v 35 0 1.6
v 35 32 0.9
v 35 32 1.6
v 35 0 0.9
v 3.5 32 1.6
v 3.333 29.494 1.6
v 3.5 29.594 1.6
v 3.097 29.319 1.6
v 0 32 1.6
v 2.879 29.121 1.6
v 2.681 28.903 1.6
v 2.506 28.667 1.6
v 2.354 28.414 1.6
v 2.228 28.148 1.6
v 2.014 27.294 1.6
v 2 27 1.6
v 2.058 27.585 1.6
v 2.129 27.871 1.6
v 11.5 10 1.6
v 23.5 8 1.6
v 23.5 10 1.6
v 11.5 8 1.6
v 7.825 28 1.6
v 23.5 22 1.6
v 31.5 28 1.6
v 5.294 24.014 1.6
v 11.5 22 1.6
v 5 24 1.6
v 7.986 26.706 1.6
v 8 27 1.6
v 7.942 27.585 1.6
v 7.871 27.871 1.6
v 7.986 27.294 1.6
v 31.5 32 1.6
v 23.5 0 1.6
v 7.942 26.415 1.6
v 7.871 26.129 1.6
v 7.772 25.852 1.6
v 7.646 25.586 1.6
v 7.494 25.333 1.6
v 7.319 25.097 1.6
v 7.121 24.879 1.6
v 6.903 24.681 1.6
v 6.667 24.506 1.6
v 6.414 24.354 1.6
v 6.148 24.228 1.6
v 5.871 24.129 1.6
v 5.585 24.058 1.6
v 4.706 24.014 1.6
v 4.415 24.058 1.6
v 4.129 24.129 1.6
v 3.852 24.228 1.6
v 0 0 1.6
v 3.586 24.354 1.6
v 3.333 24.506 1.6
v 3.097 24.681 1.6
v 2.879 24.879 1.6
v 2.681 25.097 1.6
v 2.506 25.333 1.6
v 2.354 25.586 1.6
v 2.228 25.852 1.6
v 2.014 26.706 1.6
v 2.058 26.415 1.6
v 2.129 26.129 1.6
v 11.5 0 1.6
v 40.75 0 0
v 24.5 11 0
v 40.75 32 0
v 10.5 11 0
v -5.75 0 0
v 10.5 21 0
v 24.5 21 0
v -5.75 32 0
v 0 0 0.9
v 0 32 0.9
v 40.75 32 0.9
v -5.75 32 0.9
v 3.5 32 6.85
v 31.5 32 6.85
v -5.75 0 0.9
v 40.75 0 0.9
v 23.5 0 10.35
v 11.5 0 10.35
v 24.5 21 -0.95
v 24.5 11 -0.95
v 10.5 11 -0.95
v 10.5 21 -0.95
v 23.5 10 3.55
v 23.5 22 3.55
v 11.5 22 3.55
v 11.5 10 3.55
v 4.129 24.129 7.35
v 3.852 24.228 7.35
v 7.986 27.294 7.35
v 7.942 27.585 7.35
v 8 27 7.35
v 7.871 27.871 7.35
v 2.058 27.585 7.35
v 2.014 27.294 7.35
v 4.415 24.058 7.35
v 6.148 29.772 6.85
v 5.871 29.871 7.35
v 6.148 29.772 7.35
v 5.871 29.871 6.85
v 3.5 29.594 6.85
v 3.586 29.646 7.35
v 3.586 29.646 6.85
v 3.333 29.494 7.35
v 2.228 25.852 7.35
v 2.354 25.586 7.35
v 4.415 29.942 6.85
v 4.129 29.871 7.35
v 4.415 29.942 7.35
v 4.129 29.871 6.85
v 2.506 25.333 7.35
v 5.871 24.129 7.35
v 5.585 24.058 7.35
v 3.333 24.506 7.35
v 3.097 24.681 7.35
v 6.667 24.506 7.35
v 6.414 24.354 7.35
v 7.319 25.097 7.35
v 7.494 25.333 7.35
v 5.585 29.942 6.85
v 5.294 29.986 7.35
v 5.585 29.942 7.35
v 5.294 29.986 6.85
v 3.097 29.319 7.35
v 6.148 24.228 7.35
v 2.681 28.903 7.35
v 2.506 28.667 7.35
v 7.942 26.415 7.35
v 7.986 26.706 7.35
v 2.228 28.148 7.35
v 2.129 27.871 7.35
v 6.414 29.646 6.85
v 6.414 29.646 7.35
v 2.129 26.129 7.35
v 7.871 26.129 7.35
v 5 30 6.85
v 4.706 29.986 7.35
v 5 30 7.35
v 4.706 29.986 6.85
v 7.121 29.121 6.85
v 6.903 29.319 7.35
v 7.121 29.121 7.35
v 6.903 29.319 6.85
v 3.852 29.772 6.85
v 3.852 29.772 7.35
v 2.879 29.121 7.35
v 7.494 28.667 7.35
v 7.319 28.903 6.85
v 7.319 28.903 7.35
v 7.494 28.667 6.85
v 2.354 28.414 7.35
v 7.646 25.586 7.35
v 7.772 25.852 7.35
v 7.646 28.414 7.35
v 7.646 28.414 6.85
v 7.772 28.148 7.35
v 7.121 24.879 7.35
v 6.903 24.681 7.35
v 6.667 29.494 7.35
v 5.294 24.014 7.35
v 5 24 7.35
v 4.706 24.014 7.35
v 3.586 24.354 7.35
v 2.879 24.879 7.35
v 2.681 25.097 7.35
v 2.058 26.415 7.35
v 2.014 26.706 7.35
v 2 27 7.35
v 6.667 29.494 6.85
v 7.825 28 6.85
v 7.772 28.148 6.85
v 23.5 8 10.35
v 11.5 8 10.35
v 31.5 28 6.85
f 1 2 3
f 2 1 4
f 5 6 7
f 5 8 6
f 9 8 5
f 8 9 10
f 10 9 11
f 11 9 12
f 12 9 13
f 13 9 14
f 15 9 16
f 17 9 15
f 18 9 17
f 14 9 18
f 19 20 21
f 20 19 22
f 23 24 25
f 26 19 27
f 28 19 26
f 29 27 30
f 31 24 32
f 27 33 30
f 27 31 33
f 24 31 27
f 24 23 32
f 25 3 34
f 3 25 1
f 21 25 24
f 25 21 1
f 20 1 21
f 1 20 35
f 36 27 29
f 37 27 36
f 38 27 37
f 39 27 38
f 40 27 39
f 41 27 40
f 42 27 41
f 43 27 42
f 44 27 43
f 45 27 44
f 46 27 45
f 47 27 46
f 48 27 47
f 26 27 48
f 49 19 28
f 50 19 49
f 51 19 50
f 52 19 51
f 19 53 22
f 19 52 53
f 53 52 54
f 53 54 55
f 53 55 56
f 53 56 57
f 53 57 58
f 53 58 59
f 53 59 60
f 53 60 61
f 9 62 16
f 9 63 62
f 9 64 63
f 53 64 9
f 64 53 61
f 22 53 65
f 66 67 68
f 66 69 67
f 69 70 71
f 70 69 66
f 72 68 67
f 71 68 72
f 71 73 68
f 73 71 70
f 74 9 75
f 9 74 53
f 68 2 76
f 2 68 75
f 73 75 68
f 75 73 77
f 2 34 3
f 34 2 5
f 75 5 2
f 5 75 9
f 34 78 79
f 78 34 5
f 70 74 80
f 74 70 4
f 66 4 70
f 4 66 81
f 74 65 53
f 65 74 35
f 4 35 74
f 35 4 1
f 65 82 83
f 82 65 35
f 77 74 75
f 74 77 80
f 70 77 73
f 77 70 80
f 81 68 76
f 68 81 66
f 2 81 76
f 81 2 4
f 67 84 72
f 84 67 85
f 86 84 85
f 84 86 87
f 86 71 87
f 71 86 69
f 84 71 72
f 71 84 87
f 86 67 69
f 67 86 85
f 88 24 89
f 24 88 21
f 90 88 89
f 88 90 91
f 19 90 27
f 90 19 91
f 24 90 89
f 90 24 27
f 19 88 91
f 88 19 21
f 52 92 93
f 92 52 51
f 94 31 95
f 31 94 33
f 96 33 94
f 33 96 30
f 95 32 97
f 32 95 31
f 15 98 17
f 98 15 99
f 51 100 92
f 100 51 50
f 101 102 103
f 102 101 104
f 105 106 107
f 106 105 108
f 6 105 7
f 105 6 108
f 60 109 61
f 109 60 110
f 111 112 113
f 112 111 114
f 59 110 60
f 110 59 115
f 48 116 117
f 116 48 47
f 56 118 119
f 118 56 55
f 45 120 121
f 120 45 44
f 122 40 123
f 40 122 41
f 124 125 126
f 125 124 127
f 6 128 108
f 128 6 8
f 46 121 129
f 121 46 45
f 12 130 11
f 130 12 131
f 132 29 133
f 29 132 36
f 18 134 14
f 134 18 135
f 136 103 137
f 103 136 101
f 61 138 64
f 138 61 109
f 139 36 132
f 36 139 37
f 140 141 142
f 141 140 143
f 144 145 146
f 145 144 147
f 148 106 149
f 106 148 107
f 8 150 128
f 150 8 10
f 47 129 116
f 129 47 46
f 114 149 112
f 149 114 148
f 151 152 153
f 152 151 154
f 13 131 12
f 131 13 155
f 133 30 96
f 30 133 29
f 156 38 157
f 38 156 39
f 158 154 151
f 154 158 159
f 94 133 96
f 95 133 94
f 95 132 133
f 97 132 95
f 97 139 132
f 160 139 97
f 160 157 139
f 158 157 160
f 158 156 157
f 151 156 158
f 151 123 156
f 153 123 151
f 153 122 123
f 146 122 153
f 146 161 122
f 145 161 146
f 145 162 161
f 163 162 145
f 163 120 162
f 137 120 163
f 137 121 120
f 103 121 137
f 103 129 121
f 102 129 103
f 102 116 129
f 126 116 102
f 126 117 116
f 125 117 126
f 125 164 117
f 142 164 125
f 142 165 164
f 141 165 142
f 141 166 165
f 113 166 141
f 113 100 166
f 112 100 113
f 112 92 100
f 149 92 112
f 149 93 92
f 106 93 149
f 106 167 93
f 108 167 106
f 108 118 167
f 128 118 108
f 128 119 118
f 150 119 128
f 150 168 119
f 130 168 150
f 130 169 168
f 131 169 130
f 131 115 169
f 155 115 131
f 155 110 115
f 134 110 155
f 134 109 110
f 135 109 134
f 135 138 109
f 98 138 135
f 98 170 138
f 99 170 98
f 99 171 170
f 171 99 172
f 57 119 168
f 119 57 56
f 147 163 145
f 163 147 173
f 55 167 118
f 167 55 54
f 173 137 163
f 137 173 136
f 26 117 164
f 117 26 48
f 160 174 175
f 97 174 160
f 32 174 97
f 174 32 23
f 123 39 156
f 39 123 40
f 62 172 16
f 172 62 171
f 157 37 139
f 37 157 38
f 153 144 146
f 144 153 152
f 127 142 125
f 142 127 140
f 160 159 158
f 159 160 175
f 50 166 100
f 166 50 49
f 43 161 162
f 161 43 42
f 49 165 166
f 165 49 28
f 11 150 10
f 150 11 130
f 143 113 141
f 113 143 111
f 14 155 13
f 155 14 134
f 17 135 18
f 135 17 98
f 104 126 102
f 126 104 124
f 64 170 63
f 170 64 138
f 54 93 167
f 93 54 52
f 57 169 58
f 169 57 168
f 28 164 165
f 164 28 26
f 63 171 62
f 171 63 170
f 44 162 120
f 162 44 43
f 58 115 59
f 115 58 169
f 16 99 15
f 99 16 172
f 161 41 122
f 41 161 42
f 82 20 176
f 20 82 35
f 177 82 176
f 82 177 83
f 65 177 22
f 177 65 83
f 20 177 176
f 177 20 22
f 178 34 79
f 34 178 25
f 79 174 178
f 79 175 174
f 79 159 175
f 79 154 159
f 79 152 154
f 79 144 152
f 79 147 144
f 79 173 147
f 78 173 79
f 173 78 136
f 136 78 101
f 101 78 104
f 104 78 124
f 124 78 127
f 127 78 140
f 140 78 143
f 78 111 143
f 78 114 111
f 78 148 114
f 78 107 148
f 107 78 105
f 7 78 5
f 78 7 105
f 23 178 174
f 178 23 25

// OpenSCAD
$fn = 64;

// Motor driver module overall: 35.0mm x 32.0mm, 1.6mm thick
// Keep everything as ONE connected solid (no holes/cutouts).

module motor_driver_module() {
    // PCB
    pcb_x = 35.0;
    pcb_y = 32.0;
    pcb_z = 1.6;

    // Small overlap to guarantee watertight unions
    ov = 0.25;

    // Top components (simple, connected)
    chip_x = 12.0;
    chip_y = 12.0;
    chip_z = 2.2;

    cap_r = 3.0;
    cap_z = 6.0;

    term_x = 12.0;
    term_y = 8.0;
    term_z = 9.0;

    header_x = 28.0;
    header_y = 4.0;
    header_z = 5.5;

    // Bottom feature (to match bottom-view "center tab")
    tab_x = 14.0;
    tab_y = 10.0;
    tab_z = 1.2;

    // Side "ears"/flanges (to match top/bottom views showing wider ends)
    ear_x = 6.0;
    ear_y = pcb_y;
    ear_z = 0.9;

    pcb_top = pcb_z;

    union() {
        // PCB base
        cube([pcb_x, pcb_y, pcb_z], center=false);

        // Side ears (extend slightly beyond PCB in X, but overlap into PCB)
        translate([-ear_x + ov, 0, 0])
            cube([ear_x, ear_y, ear_z], center=false);

        translate([pcb_x - ov, 0, 0])
            cube([ear_x, ear_y, ear_z], center=false);

        // Bottom center tab (extends below PCB, overlaps into PCB)
        translate([(pcb_x - tab_x)/2, (pcb_y - tab_y)/2, -tab_z + ov])
            cube([tab_x, tab_y, tab_z], center=false);

        // Main driver IC (centered on board)
        translate([(pcb_x - chip_x)/2, (pcb_y - chip_y)/2, pcb_top - ov])
            cube([chip_x, chip_y, chip_z], center=false);

        // Electrolytic capacitor near a corner (connected to PCB)
        translate([cap_r + 2.0, pcb_y - (cap_r + 2.0), pcb_top - ov])
            cylinder(r=cap_r, h=cap_z, center=false);

        // Screw terminal block along one short edge (y=0)
        translate([(pcb_x - term_x)/2, 0, pcb_top - ov])
            cube([term_x, term_y, term_z], center=false);

        // Pin header along opposite short edge (y=pcb_y - header_y)
        translate([(pcb_x - header_x)/2, pcb_y - header_y, pcb_top - ov])
            cube([header_x, header_y, header_z], center=false);
    }
}

motor_driver_module();
